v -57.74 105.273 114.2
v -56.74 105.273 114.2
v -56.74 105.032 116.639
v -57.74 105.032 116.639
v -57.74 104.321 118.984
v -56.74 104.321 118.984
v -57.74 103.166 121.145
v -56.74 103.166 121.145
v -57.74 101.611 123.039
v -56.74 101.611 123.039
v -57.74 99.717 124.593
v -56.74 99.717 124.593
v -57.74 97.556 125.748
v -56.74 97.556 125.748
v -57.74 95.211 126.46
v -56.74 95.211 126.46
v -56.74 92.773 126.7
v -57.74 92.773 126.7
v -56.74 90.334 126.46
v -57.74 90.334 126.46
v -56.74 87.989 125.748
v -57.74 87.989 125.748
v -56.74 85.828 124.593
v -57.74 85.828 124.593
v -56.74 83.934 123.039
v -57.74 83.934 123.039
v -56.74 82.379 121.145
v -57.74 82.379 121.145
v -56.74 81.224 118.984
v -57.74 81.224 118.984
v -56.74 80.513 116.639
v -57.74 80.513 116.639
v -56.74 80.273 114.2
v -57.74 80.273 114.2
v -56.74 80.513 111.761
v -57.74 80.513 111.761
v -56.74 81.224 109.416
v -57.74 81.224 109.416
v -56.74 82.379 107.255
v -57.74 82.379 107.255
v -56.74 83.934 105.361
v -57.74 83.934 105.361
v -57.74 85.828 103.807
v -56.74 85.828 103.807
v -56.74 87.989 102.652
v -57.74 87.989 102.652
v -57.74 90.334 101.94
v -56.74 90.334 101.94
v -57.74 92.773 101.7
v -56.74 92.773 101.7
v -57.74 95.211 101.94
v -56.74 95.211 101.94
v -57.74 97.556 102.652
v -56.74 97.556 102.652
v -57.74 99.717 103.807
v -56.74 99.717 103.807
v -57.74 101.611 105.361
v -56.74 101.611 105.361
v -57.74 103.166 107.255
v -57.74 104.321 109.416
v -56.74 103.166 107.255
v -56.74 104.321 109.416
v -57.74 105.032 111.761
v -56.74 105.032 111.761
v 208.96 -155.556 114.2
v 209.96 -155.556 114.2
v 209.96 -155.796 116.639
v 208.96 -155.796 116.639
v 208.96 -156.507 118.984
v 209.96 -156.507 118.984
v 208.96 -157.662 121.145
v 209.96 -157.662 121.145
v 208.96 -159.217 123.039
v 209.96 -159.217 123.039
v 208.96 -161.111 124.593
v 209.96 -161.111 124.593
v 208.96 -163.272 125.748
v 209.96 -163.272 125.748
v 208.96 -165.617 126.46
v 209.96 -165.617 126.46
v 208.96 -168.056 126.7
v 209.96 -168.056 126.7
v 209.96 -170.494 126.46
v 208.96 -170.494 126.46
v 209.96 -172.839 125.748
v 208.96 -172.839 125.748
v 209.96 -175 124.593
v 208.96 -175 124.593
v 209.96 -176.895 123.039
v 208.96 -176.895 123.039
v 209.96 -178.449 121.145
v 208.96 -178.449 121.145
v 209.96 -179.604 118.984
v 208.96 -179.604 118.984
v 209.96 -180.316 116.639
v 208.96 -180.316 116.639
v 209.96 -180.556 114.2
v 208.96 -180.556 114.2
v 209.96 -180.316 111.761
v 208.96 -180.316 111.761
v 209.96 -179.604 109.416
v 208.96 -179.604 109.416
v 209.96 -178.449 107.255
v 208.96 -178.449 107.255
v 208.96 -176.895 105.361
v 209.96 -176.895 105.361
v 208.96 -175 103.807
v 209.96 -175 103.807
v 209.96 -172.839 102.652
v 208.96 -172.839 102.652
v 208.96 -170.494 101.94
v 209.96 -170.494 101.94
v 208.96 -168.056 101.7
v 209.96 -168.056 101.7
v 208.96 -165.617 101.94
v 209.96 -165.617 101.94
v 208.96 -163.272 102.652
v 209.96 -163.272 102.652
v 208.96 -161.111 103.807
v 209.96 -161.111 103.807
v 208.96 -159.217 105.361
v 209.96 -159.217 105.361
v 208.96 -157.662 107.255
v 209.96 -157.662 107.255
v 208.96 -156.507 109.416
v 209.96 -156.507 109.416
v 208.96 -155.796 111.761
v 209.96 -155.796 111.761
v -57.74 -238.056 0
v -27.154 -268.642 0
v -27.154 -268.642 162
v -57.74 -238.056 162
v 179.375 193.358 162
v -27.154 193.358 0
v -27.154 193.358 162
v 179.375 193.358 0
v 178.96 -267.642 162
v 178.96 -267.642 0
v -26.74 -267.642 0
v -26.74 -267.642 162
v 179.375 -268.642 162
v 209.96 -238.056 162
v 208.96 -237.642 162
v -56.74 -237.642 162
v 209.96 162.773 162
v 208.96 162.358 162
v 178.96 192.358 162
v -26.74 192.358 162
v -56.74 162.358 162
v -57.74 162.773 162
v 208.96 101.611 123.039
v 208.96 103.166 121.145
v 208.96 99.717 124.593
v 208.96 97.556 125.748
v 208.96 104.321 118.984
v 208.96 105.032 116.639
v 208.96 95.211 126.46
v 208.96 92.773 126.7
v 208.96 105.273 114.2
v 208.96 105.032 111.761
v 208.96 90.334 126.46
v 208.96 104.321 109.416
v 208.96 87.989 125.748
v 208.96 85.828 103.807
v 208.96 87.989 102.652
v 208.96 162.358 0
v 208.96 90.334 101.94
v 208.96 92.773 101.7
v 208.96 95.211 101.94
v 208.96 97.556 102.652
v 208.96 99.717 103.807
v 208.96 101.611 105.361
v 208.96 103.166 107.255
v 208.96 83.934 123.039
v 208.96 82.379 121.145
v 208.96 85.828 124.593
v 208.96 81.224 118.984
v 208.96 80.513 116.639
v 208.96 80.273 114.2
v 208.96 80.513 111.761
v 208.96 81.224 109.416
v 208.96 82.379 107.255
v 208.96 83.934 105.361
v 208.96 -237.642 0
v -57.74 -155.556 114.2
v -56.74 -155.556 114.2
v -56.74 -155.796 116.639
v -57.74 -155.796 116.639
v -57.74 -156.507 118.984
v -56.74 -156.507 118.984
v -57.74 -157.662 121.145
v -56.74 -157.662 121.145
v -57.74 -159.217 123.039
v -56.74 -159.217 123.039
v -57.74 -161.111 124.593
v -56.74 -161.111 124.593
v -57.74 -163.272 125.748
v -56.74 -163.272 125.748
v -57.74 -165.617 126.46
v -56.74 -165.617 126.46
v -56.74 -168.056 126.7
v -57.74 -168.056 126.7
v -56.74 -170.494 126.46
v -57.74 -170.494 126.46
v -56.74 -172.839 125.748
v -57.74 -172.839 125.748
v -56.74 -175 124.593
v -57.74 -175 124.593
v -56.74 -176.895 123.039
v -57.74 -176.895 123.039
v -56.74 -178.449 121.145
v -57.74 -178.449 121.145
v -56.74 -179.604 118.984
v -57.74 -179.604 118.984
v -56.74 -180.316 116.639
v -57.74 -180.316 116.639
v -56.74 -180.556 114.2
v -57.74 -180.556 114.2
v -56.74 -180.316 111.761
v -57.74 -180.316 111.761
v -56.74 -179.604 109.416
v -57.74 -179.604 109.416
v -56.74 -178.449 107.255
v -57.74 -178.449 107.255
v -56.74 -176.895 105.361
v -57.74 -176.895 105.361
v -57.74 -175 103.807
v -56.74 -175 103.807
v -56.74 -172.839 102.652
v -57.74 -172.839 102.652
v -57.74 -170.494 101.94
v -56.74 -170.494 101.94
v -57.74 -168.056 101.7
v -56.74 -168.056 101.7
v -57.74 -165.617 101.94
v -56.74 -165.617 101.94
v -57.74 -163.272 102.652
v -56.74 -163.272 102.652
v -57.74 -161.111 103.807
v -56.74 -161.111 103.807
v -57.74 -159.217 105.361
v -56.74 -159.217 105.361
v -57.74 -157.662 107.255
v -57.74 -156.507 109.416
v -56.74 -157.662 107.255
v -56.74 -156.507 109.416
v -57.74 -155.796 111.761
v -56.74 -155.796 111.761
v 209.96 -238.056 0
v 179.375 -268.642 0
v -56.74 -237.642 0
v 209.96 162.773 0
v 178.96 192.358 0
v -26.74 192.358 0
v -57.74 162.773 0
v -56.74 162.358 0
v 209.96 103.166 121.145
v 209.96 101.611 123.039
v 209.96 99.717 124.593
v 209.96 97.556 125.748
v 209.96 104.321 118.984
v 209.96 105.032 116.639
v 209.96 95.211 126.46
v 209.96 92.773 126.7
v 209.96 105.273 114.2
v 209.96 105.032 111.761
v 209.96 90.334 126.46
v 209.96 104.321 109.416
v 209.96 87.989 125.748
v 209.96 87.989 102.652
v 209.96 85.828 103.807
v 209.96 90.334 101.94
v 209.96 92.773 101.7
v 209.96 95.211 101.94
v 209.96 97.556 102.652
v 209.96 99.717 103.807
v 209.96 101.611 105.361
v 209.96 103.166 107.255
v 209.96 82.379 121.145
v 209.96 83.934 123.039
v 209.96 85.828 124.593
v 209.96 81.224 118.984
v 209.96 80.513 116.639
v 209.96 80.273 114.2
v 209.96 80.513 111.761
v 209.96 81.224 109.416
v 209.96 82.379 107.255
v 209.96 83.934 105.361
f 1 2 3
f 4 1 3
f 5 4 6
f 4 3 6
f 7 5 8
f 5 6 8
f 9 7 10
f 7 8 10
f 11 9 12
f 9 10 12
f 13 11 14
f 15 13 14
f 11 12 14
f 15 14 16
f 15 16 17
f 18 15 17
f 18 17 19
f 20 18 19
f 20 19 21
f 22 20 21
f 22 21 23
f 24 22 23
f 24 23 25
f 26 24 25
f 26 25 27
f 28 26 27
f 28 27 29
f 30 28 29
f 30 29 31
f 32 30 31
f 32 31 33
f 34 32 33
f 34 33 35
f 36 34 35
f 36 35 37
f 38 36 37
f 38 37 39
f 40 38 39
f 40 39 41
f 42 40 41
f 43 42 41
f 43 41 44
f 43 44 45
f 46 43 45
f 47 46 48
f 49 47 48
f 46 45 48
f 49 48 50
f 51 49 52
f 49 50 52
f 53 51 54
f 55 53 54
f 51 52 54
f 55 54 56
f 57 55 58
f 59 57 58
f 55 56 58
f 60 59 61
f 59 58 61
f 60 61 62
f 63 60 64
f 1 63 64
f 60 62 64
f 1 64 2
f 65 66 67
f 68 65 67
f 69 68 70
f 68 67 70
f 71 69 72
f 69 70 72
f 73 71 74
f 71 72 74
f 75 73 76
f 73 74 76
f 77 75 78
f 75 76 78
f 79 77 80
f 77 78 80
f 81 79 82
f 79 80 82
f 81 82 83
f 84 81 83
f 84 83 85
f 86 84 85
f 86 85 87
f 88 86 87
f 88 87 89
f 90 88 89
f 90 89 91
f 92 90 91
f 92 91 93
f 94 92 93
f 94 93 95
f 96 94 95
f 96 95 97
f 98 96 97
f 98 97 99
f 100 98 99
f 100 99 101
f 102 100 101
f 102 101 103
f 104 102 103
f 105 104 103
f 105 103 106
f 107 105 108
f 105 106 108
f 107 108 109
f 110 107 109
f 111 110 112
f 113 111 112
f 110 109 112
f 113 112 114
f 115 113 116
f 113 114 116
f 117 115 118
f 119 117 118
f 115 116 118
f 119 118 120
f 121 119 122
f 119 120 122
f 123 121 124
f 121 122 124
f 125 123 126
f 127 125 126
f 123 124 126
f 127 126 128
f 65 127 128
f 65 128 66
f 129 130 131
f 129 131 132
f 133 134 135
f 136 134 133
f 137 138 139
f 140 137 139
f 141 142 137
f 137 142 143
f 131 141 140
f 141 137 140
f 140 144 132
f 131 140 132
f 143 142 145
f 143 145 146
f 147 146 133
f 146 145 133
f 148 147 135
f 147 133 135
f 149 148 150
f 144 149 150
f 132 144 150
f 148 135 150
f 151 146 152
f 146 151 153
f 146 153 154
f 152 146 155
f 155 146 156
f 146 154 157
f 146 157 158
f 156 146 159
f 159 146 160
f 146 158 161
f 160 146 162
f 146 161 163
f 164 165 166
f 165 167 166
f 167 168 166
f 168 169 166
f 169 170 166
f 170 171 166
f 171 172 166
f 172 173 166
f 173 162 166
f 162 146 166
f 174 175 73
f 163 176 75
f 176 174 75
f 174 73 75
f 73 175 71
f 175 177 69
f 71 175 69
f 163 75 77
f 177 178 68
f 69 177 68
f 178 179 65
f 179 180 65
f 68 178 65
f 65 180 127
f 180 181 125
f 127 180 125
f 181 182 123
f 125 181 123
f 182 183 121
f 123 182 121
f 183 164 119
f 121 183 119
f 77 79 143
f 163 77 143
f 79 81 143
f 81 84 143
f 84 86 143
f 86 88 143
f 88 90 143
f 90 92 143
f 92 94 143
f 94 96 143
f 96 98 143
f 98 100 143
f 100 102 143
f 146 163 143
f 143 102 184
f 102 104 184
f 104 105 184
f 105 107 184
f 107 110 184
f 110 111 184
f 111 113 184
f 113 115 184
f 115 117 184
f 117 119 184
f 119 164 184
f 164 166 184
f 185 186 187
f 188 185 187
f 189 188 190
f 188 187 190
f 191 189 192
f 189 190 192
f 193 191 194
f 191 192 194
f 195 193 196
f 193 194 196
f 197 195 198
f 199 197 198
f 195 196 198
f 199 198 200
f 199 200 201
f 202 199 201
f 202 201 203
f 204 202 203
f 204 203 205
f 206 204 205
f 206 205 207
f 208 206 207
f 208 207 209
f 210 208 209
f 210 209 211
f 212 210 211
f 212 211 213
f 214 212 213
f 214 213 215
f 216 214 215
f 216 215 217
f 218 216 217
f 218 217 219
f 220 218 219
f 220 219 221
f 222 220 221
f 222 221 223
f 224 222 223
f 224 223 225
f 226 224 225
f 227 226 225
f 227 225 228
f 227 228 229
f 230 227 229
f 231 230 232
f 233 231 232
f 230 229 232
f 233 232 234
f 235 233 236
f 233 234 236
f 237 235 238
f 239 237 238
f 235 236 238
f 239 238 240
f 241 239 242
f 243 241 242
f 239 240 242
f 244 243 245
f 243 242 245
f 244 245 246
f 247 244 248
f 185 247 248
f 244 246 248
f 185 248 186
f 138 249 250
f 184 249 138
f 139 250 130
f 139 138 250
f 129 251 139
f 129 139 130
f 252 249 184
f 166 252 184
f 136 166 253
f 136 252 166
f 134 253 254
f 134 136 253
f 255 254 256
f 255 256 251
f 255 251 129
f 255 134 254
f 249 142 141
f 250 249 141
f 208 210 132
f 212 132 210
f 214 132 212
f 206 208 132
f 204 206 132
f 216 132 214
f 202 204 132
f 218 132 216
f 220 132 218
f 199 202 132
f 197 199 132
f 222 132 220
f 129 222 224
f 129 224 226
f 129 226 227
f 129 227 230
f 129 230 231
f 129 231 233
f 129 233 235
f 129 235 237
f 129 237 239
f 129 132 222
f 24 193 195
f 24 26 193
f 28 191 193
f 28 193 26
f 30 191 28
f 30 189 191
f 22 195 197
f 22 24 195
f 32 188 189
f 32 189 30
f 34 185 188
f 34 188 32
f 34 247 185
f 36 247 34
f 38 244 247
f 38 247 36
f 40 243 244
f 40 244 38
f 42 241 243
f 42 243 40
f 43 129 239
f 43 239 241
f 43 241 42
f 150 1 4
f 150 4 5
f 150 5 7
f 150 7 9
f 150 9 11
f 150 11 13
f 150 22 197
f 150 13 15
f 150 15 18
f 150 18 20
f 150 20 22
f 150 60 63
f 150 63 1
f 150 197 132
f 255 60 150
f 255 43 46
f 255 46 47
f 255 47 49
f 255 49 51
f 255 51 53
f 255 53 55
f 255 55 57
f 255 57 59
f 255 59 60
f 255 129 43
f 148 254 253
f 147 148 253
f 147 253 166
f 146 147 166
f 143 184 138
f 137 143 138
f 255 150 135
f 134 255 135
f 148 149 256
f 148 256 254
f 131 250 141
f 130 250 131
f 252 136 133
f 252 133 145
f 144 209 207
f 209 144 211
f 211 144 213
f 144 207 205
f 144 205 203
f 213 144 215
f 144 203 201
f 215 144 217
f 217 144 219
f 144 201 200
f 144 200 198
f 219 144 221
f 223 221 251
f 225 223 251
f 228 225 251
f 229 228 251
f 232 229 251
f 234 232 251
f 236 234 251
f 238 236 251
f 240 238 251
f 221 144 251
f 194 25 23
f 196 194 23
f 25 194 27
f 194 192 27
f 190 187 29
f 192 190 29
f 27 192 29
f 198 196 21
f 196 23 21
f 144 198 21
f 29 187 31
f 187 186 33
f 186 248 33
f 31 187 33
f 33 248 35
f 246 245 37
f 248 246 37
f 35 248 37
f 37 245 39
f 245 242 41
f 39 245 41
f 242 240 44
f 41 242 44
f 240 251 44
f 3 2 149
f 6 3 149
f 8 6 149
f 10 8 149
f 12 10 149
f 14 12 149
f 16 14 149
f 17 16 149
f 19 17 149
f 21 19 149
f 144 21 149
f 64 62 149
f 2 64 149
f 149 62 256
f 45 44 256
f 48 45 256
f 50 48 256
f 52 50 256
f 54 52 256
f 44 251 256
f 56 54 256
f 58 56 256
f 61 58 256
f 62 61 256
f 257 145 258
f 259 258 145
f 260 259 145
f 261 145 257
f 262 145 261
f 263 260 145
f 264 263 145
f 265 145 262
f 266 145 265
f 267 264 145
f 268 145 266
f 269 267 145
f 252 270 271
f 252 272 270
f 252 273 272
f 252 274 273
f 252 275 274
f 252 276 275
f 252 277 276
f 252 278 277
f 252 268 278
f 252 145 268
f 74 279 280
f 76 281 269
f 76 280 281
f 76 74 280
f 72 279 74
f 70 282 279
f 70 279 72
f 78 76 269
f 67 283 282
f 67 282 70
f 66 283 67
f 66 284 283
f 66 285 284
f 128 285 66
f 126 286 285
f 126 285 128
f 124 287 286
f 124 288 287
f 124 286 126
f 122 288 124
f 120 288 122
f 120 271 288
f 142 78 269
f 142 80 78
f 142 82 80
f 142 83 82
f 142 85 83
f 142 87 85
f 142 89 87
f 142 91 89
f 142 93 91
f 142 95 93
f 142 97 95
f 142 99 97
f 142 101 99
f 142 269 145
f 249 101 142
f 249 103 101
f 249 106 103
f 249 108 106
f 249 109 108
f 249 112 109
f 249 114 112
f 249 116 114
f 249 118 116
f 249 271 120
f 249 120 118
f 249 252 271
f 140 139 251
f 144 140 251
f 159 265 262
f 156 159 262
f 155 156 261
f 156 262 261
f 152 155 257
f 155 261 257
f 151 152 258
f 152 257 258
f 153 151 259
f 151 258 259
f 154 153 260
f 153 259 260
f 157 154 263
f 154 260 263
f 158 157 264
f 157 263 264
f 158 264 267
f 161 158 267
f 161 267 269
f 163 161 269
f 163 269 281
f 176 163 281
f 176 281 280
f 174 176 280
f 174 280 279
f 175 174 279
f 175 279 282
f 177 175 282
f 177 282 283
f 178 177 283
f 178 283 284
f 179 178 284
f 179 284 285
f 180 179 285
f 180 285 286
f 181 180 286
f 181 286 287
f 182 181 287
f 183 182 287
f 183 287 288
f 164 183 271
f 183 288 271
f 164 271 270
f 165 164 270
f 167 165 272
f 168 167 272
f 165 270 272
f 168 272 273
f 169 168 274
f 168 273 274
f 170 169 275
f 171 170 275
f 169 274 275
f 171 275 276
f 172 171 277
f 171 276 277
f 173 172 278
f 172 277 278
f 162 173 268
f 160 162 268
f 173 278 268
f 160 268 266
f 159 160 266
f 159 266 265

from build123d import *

# Parameters (mm, degrees)
BOSS_EXTRUDE1_DEPTH = 162
SKETCH2_R           = 12.5
CUT_EXTRUDE1_DEPTH  = 413.402232553


with BuildPart() as part:
    # Sketch1 → Boss-Extrude1 (new body)
    with BuildSketch(Plane.XY):
        Polygon((-57.739503943, 162.772609534), (-27.153717505, 193.358395972), (179.374709619, 193.358395972), (209.960496057, 162.772609534), (209.960496057, -238.055817591), (179.374709619, -268.641604028), (-27.153717505, -268.641604028), (-57.739503943, -238.055817591), align=None)
        Polygon((-56.739503943, 162.358395972), (-26.739503943, 192.358395972), (178.960496057, 192.358395972), (208.960496057, 162.358395972), (208.960496057, -237.641604028), (178.960496057, -267.641604028), (-26.739503943, -267.641604028), (-56.739503943, -237.641604028), align=None, mode=Mode.SUBTRACT)
    extrude(amount=BOSS_EXTRUDE1_DEPTH)

    # Sketch2 → Cut-Extrude1 (cut, through all)
    with BuildSketch(Plane(origin=(209.960496057, 0, 0), x_dir=(0, 0, -1), z_dir=(1, 0, 0))):
        with Locations(Location((-114.2, -168.055817591, 0), (0, 0, 90))):
            Circle(SKETCH2_R)
        with Locations(Location((-114.2, 92.772609534, 0), (0, 0, 90))):
            Circle(SKETCH2_R)
    extrude(amount=-CUT_EXTRUDE1_DEPTH, mode=Mode.SUBTRACT)


solid = part.part
